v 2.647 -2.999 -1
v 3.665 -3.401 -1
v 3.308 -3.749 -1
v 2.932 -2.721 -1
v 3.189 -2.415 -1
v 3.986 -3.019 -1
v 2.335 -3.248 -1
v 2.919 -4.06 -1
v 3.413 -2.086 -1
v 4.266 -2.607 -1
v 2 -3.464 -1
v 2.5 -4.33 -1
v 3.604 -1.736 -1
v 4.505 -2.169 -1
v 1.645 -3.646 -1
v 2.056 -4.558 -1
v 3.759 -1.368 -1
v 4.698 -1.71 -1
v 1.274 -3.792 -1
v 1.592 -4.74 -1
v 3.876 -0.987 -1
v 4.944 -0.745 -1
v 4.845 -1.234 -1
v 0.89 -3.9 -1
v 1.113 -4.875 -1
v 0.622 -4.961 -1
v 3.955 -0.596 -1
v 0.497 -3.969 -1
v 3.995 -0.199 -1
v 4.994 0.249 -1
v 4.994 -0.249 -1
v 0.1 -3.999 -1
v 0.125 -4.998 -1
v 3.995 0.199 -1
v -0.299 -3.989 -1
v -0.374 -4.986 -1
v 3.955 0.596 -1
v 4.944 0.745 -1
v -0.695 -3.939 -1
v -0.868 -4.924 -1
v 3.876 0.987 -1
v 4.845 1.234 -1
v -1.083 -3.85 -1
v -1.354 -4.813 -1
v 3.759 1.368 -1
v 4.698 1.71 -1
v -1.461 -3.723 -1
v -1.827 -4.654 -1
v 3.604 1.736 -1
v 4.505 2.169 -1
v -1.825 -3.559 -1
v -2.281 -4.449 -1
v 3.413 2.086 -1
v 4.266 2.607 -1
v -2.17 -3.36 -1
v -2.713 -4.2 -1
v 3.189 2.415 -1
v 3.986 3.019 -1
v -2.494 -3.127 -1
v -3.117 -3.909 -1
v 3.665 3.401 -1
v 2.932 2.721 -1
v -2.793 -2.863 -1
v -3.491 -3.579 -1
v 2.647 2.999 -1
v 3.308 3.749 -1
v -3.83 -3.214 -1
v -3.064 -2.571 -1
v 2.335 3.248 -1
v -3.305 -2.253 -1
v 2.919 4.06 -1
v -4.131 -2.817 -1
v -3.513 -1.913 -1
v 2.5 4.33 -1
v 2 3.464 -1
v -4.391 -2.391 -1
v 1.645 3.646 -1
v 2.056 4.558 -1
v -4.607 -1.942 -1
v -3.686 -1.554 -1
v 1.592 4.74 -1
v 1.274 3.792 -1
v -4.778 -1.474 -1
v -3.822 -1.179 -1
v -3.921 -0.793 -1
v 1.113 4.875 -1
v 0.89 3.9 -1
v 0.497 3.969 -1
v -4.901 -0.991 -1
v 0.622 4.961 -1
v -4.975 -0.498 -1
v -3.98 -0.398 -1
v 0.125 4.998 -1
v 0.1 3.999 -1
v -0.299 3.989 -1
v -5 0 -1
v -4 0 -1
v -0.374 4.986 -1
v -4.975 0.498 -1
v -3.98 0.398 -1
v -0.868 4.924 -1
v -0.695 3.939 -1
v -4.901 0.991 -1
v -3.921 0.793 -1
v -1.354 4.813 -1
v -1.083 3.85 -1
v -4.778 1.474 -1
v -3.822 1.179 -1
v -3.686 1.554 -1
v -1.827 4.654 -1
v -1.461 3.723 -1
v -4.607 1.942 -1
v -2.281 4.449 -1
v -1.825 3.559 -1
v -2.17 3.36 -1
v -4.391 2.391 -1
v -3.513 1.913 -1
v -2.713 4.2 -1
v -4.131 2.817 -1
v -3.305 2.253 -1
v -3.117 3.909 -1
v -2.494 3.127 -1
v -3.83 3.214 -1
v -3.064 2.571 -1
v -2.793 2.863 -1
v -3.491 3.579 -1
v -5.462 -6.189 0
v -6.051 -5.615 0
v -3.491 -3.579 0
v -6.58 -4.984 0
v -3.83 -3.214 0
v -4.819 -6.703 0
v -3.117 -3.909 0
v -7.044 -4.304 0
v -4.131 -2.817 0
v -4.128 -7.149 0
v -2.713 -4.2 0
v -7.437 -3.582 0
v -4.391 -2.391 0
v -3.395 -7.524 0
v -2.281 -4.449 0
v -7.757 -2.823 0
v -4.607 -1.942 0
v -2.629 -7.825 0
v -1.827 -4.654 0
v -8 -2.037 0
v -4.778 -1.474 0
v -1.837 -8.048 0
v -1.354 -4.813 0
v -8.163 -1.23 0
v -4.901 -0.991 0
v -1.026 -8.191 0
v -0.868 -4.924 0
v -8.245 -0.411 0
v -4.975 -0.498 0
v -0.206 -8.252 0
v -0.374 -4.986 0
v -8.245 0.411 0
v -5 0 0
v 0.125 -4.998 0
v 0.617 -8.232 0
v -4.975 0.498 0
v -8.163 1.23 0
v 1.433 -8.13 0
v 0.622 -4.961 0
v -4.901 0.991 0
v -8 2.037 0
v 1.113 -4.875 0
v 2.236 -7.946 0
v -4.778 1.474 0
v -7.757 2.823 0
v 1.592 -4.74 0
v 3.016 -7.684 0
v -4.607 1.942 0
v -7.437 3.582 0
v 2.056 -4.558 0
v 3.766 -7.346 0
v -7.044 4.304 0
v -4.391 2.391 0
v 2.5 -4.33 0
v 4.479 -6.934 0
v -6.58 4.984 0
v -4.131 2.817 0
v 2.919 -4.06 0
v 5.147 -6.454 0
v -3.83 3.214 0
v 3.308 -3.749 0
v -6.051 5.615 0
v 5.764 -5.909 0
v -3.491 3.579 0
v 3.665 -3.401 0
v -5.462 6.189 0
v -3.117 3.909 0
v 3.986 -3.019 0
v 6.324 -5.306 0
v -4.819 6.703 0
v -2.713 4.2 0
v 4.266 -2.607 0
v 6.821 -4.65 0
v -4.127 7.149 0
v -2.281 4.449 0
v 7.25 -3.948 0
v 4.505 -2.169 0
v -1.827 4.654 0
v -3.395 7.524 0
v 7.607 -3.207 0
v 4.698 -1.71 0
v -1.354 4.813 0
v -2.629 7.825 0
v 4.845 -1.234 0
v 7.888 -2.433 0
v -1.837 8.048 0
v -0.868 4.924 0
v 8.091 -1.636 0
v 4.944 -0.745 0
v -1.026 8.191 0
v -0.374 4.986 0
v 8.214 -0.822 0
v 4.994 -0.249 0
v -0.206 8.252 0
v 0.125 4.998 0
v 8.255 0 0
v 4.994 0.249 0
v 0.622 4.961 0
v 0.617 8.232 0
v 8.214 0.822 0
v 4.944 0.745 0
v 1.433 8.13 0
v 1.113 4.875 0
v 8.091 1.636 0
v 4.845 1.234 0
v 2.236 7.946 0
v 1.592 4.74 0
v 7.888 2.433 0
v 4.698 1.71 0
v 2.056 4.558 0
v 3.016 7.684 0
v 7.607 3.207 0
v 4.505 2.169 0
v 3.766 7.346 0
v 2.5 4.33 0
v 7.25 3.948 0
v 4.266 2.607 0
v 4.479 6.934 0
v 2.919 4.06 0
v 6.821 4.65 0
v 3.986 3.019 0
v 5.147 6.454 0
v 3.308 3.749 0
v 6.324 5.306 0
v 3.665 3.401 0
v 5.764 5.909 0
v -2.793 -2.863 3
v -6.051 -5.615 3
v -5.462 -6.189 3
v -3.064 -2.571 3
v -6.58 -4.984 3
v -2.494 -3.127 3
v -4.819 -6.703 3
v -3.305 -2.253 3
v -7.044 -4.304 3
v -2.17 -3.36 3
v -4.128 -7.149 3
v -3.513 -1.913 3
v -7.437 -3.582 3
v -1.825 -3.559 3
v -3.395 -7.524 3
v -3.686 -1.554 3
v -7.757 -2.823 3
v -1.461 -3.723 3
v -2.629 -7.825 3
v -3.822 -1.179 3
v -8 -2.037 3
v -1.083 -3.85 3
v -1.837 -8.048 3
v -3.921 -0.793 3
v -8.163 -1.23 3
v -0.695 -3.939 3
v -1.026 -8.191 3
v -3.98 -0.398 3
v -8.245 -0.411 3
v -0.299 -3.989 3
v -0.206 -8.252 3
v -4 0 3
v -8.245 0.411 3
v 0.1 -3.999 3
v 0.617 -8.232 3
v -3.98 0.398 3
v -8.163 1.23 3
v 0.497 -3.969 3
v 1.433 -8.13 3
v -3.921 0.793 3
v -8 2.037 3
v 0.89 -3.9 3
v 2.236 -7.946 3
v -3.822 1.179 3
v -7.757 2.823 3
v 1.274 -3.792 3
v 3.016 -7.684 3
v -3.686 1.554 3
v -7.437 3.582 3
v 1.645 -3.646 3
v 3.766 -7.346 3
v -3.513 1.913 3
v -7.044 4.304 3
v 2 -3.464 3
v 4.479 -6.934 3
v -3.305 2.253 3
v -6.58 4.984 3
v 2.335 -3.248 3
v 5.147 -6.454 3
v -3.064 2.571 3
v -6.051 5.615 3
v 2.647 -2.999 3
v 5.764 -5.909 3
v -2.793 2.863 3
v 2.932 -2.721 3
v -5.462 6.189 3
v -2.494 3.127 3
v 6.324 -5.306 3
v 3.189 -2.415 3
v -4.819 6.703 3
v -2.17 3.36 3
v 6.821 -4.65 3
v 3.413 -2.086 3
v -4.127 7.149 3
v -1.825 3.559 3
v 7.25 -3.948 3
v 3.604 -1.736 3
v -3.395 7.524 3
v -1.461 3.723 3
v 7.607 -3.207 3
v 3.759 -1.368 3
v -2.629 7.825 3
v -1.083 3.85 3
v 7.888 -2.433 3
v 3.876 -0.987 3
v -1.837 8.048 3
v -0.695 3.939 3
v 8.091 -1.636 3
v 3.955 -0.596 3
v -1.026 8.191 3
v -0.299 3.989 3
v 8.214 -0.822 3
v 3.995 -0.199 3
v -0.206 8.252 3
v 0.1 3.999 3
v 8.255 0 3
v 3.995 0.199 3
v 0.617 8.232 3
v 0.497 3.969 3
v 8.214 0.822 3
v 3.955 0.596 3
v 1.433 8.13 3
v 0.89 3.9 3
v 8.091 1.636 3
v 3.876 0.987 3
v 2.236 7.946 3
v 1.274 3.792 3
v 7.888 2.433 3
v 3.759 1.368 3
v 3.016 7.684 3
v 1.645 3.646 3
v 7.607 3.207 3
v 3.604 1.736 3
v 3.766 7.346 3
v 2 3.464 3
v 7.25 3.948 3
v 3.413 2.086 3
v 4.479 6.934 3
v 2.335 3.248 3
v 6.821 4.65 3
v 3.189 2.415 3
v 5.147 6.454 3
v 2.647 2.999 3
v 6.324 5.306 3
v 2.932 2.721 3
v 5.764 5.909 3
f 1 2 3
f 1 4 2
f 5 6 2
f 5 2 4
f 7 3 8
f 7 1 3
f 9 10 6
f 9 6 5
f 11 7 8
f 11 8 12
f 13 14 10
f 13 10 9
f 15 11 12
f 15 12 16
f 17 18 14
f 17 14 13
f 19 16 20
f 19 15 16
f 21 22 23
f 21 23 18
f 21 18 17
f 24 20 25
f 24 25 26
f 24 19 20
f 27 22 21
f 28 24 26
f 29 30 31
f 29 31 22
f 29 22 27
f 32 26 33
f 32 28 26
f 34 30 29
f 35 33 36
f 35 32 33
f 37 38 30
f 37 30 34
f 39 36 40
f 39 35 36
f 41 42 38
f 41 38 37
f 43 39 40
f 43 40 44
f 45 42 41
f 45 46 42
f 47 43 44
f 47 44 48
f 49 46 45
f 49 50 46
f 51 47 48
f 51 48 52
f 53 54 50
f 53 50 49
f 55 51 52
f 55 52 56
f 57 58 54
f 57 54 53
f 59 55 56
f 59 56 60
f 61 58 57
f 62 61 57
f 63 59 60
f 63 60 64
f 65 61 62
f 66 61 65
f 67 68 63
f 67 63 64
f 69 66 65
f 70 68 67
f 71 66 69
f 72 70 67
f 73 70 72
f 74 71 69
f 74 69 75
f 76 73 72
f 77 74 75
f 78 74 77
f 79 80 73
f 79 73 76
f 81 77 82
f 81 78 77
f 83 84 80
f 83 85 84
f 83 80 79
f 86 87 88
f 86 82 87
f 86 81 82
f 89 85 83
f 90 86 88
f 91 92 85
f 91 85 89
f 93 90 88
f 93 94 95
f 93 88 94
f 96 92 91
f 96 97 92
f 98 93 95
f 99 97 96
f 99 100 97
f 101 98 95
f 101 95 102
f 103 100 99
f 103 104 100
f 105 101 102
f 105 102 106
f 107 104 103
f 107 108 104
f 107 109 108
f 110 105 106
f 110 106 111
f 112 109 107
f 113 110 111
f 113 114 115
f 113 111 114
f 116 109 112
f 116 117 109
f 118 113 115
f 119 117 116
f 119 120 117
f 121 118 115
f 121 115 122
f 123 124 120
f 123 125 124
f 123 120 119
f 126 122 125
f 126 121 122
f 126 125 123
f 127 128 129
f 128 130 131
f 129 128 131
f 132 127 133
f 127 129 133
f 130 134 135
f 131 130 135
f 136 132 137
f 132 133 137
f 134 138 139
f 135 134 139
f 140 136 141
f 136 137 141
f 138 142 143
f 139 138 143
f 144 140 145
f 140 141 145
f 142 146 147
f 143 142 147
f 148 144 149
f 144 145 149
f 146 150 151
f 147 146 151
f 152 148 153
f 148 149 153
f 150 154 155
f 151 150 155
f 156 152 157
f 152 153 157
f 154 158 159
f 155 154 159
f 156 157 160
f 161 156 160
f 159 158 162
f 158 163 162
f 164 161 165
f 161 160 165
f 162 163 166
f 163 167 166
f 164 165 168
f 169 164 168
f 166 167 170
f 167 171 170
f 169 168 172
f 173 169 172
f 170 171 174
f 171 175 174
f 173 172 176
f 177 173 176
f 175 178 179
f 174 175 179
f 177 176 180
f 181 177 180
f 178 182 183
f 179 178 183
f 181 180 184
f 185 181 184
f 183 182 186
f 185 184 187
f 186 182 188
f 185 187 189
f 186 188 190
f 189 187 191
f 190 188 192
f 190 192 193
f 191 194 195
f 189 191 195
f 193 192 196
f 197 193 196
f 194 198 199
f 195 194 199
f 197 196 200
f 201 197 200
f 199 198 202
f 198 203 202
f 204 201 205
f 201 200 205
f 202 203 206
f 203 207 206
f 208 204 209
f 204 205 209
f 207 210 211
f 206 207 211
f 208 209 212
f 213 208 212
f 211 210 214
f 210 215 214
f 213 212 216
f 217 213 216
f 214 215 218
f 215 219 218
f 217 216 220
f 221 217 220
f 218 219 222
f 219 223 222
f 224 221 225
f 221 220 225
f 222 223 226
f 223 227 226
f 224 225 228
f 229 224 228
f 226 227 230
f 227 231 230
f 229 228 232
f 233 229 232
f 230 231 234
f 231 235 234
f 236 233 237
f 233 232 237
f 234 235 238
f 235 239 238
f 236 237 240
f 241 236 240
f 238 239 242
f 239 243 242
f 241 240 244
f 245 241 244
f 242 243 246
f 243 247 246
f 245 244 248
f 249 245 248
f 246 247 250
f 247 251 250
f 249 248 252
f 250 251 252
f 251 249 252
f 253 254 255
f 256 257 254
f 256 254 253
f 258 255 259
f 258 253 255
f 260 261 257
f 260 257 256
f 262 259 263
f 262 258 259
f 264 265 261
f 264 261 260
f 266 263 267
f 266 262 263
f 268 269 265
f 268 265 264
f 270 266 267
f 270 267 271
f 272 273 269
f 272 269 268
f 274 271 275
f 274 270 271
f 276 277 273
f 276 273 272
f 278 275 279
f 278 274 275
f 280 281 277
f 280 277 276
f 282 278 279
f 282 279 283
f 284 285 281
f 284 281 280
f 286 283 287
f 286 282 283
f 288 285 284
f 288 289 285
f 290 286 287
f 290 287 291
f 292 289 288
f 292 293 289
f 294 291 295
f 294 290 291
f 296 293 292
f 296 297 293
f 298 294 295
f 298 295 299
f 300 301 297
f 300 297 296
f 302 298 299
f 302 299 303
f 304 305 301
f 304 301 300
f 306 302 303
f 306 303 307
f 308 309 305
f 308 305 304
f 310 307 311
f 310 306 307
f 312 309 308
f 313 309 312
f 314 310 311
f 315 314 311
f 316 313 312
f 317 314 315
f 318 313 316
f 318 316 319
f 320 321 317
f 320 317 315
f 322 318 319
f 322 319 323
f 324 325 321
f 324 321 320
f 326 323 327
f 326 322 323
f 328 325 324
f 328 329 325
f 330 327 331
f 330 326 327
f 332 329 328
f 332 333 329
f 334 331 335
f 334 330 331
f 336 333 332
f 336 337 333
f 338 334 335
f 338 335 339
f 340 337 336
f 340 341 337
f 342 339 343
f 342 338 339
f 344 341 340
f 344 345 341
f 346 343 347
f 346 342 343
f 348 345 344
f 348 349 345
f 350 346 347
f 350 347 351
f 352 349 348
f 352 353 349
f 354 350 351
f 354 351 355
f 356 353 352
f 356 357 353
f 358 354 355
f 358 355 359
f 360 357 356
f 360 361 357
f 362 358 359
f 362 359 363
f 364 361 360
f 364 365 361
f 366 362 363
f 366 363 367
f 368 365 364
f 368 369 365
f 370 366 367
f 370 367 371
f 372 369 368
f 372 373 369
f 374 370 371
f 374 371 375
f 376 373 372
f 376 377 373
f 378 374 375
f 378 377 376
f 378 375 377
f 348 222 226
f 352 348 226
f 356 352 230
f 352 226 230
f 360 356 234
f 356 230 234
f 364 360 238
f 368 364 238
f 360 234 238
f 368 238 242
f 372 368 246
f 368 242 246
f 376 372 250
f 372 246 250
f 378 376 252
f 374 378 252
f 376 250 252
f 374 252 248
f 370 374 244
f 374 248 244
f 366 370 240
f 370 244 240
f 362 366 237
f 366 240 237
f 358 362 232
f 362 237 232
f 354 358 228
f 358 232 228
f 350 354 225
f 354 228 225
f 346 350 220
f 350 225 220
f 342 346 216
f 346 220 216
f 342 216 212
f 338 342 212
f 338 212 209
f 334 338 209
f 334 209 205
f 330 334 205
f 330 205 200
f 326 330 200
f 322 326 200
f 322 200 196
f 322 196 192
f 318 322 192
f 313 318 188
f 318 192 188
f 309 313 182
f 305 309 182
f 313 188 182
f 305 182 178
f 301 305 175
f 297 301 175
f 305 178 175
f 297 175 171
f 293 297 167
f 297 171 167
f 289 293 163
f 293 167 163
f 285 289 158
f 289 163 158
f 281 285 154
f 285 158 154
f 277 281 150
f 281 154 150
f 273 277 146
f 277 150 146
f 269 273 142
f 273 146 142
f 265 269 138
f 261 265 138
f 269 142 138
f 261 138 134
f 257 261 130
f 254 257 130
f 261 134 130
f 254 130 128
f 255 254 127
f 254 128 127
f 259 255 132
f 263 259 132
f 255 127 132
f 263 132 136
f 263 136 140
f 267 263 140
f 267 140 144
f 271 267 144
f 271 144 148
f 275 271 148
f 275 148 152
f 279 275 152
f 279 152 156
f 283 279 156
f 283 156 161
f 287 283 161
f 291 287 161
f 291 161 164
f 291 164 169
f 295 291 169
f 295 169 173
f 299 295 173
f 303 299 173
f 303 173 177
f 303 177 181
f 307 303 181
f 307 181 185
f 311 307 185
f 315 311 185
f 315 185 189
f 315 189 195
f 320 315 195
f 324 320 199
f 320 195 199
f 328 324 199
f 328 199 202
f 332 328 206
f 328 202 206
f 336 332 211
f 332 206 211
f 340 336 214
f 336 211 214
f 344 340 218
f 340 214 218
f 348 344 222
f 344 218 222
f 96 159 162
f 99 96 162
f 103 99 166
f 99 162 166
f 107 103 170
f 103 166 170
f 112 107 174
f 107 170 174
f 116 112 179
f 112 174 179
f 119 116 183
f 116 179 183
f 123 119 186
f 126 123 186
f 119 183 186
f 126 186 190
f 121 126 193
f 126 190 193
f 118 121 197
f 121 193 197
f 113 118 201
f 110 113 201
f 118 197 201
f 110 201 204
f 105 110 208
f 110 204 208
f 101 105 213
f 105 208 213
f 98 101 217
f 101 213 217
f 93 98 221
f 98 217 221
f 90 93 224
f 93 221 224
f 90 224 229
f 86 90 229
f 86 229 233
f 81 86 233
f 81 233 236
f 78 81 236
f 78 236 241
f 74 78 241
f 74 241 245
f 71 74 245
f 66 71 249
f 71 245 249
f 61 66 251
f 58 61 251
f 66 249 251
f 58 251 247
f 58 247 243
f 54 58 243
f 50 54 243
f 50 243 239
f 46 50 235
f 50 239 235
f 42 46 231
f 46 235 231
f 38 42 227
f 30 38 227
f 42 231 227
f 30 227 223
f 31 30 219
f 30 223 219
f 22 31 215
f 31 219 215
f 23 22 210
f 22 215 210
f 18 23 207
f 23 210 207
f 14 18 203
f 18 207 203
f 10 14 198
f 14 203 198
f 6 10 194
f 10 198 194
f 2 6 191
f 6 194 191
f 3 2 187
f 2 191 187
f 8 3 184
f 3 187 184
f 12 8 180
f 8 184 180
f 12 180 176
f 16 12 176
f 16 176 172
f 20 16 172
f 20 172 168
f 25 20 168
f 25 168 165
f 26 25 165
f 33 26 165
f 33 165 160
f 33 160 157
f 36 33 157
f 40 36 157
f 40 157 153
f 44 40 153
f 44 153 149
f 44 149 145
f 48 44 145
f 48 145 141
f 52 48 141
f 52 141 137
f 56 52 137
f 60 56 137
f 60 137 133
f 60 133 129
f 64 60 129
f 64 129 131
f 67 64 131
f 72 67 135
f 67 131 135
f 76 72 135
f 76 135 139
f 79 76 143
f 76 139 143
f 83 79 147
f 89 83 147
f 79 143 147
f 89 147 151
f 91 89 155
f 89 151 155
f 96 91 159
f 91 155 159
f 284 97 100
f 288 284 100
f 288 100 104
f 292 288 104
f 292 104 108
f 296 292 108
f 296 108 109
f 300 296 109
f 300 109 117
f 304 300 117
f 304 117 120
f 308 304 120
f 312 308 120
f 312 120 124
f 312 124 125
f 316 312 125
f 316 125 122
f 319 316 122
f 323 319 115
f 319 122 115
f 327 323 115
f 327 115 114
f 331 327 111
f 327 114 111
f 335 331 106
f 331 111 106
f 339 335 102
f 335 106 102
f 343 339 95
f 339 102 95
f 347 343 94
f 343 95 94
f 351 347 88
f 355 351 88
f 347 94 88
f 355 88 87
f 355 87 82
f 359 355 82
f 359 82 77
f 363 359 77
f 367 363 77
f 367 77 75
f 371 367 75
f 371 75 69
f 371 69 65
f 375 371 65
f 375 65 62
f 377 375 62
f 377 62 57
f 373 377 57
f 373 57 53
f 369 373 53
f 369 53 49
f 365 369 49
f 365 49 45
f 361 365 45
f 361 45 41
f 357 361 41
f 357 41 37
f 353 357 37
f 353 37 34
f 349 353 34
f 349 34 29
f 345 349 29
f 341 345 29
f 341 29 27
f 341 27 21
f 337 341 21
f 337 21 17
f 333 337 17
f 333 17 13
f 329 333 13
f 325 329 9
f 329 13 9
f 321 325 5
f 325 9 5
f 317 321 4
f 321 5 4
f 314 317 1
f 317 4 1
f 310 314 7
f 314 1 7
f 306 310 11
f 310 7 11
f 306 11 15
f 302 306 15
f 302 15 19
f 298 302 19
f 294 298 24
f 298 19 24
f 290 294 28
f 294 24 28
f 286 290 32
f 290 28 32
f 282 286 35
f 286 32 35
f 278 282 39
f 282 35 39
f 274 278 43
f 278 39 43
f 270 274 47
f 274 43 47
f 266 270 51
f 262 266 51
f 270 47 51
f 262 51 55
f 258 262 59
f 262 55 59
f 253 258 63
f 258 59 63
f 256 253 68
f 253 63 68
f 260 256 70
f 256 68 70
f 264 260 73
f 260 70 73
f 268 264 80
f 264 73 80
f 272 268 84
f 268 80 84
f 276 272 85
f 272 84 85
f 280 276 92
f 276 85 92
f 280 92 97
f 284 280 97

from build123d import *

# Parameters (mm, degrees)
SKETCH1_R           = 8.255
BOSS_EXTRUDE1_DEPTH = 3
SKETCH2_R           = 5
BOSS_EXTRUDE2_DEPTH = 1
SKETCH3_R           = 4
CUT_EXTRUDE1_DEPTH  = 5


with BuildPart() as part:
    # Sketch1 → Boss-Extrude1 (new body)
    with BuildSketch(Plane.XY):
        Circle(SKETCH1_R)
    extrude(amount=BOSS_EXTRUDE1_DEPTH)

    # Sketch2 → Boss-Extrude2 (add)
    with BuildSketch(Plane(origin=(0, 0, 0), x_dir=(-1, 0, 0), z_dir=(0, 0, -1))):
        Circle(SKETCH2_R)
    extrude(amount=BOSS_EXTRUDE2_DEPTH)

    # Sketch3 → Cut-Extrude1 (cut, through all)
    with BuildSketch(Plane(origin=(0, 0, -1), x_dir=(-1, 0, 0), z_dir=(0, 0, -1))):
        Circle(SKETCH3_R)
    extrude(amount=-CUT_EXTRUDE1_DEPTH, mode=Mode.SUBTRACT)


solid = part.part
